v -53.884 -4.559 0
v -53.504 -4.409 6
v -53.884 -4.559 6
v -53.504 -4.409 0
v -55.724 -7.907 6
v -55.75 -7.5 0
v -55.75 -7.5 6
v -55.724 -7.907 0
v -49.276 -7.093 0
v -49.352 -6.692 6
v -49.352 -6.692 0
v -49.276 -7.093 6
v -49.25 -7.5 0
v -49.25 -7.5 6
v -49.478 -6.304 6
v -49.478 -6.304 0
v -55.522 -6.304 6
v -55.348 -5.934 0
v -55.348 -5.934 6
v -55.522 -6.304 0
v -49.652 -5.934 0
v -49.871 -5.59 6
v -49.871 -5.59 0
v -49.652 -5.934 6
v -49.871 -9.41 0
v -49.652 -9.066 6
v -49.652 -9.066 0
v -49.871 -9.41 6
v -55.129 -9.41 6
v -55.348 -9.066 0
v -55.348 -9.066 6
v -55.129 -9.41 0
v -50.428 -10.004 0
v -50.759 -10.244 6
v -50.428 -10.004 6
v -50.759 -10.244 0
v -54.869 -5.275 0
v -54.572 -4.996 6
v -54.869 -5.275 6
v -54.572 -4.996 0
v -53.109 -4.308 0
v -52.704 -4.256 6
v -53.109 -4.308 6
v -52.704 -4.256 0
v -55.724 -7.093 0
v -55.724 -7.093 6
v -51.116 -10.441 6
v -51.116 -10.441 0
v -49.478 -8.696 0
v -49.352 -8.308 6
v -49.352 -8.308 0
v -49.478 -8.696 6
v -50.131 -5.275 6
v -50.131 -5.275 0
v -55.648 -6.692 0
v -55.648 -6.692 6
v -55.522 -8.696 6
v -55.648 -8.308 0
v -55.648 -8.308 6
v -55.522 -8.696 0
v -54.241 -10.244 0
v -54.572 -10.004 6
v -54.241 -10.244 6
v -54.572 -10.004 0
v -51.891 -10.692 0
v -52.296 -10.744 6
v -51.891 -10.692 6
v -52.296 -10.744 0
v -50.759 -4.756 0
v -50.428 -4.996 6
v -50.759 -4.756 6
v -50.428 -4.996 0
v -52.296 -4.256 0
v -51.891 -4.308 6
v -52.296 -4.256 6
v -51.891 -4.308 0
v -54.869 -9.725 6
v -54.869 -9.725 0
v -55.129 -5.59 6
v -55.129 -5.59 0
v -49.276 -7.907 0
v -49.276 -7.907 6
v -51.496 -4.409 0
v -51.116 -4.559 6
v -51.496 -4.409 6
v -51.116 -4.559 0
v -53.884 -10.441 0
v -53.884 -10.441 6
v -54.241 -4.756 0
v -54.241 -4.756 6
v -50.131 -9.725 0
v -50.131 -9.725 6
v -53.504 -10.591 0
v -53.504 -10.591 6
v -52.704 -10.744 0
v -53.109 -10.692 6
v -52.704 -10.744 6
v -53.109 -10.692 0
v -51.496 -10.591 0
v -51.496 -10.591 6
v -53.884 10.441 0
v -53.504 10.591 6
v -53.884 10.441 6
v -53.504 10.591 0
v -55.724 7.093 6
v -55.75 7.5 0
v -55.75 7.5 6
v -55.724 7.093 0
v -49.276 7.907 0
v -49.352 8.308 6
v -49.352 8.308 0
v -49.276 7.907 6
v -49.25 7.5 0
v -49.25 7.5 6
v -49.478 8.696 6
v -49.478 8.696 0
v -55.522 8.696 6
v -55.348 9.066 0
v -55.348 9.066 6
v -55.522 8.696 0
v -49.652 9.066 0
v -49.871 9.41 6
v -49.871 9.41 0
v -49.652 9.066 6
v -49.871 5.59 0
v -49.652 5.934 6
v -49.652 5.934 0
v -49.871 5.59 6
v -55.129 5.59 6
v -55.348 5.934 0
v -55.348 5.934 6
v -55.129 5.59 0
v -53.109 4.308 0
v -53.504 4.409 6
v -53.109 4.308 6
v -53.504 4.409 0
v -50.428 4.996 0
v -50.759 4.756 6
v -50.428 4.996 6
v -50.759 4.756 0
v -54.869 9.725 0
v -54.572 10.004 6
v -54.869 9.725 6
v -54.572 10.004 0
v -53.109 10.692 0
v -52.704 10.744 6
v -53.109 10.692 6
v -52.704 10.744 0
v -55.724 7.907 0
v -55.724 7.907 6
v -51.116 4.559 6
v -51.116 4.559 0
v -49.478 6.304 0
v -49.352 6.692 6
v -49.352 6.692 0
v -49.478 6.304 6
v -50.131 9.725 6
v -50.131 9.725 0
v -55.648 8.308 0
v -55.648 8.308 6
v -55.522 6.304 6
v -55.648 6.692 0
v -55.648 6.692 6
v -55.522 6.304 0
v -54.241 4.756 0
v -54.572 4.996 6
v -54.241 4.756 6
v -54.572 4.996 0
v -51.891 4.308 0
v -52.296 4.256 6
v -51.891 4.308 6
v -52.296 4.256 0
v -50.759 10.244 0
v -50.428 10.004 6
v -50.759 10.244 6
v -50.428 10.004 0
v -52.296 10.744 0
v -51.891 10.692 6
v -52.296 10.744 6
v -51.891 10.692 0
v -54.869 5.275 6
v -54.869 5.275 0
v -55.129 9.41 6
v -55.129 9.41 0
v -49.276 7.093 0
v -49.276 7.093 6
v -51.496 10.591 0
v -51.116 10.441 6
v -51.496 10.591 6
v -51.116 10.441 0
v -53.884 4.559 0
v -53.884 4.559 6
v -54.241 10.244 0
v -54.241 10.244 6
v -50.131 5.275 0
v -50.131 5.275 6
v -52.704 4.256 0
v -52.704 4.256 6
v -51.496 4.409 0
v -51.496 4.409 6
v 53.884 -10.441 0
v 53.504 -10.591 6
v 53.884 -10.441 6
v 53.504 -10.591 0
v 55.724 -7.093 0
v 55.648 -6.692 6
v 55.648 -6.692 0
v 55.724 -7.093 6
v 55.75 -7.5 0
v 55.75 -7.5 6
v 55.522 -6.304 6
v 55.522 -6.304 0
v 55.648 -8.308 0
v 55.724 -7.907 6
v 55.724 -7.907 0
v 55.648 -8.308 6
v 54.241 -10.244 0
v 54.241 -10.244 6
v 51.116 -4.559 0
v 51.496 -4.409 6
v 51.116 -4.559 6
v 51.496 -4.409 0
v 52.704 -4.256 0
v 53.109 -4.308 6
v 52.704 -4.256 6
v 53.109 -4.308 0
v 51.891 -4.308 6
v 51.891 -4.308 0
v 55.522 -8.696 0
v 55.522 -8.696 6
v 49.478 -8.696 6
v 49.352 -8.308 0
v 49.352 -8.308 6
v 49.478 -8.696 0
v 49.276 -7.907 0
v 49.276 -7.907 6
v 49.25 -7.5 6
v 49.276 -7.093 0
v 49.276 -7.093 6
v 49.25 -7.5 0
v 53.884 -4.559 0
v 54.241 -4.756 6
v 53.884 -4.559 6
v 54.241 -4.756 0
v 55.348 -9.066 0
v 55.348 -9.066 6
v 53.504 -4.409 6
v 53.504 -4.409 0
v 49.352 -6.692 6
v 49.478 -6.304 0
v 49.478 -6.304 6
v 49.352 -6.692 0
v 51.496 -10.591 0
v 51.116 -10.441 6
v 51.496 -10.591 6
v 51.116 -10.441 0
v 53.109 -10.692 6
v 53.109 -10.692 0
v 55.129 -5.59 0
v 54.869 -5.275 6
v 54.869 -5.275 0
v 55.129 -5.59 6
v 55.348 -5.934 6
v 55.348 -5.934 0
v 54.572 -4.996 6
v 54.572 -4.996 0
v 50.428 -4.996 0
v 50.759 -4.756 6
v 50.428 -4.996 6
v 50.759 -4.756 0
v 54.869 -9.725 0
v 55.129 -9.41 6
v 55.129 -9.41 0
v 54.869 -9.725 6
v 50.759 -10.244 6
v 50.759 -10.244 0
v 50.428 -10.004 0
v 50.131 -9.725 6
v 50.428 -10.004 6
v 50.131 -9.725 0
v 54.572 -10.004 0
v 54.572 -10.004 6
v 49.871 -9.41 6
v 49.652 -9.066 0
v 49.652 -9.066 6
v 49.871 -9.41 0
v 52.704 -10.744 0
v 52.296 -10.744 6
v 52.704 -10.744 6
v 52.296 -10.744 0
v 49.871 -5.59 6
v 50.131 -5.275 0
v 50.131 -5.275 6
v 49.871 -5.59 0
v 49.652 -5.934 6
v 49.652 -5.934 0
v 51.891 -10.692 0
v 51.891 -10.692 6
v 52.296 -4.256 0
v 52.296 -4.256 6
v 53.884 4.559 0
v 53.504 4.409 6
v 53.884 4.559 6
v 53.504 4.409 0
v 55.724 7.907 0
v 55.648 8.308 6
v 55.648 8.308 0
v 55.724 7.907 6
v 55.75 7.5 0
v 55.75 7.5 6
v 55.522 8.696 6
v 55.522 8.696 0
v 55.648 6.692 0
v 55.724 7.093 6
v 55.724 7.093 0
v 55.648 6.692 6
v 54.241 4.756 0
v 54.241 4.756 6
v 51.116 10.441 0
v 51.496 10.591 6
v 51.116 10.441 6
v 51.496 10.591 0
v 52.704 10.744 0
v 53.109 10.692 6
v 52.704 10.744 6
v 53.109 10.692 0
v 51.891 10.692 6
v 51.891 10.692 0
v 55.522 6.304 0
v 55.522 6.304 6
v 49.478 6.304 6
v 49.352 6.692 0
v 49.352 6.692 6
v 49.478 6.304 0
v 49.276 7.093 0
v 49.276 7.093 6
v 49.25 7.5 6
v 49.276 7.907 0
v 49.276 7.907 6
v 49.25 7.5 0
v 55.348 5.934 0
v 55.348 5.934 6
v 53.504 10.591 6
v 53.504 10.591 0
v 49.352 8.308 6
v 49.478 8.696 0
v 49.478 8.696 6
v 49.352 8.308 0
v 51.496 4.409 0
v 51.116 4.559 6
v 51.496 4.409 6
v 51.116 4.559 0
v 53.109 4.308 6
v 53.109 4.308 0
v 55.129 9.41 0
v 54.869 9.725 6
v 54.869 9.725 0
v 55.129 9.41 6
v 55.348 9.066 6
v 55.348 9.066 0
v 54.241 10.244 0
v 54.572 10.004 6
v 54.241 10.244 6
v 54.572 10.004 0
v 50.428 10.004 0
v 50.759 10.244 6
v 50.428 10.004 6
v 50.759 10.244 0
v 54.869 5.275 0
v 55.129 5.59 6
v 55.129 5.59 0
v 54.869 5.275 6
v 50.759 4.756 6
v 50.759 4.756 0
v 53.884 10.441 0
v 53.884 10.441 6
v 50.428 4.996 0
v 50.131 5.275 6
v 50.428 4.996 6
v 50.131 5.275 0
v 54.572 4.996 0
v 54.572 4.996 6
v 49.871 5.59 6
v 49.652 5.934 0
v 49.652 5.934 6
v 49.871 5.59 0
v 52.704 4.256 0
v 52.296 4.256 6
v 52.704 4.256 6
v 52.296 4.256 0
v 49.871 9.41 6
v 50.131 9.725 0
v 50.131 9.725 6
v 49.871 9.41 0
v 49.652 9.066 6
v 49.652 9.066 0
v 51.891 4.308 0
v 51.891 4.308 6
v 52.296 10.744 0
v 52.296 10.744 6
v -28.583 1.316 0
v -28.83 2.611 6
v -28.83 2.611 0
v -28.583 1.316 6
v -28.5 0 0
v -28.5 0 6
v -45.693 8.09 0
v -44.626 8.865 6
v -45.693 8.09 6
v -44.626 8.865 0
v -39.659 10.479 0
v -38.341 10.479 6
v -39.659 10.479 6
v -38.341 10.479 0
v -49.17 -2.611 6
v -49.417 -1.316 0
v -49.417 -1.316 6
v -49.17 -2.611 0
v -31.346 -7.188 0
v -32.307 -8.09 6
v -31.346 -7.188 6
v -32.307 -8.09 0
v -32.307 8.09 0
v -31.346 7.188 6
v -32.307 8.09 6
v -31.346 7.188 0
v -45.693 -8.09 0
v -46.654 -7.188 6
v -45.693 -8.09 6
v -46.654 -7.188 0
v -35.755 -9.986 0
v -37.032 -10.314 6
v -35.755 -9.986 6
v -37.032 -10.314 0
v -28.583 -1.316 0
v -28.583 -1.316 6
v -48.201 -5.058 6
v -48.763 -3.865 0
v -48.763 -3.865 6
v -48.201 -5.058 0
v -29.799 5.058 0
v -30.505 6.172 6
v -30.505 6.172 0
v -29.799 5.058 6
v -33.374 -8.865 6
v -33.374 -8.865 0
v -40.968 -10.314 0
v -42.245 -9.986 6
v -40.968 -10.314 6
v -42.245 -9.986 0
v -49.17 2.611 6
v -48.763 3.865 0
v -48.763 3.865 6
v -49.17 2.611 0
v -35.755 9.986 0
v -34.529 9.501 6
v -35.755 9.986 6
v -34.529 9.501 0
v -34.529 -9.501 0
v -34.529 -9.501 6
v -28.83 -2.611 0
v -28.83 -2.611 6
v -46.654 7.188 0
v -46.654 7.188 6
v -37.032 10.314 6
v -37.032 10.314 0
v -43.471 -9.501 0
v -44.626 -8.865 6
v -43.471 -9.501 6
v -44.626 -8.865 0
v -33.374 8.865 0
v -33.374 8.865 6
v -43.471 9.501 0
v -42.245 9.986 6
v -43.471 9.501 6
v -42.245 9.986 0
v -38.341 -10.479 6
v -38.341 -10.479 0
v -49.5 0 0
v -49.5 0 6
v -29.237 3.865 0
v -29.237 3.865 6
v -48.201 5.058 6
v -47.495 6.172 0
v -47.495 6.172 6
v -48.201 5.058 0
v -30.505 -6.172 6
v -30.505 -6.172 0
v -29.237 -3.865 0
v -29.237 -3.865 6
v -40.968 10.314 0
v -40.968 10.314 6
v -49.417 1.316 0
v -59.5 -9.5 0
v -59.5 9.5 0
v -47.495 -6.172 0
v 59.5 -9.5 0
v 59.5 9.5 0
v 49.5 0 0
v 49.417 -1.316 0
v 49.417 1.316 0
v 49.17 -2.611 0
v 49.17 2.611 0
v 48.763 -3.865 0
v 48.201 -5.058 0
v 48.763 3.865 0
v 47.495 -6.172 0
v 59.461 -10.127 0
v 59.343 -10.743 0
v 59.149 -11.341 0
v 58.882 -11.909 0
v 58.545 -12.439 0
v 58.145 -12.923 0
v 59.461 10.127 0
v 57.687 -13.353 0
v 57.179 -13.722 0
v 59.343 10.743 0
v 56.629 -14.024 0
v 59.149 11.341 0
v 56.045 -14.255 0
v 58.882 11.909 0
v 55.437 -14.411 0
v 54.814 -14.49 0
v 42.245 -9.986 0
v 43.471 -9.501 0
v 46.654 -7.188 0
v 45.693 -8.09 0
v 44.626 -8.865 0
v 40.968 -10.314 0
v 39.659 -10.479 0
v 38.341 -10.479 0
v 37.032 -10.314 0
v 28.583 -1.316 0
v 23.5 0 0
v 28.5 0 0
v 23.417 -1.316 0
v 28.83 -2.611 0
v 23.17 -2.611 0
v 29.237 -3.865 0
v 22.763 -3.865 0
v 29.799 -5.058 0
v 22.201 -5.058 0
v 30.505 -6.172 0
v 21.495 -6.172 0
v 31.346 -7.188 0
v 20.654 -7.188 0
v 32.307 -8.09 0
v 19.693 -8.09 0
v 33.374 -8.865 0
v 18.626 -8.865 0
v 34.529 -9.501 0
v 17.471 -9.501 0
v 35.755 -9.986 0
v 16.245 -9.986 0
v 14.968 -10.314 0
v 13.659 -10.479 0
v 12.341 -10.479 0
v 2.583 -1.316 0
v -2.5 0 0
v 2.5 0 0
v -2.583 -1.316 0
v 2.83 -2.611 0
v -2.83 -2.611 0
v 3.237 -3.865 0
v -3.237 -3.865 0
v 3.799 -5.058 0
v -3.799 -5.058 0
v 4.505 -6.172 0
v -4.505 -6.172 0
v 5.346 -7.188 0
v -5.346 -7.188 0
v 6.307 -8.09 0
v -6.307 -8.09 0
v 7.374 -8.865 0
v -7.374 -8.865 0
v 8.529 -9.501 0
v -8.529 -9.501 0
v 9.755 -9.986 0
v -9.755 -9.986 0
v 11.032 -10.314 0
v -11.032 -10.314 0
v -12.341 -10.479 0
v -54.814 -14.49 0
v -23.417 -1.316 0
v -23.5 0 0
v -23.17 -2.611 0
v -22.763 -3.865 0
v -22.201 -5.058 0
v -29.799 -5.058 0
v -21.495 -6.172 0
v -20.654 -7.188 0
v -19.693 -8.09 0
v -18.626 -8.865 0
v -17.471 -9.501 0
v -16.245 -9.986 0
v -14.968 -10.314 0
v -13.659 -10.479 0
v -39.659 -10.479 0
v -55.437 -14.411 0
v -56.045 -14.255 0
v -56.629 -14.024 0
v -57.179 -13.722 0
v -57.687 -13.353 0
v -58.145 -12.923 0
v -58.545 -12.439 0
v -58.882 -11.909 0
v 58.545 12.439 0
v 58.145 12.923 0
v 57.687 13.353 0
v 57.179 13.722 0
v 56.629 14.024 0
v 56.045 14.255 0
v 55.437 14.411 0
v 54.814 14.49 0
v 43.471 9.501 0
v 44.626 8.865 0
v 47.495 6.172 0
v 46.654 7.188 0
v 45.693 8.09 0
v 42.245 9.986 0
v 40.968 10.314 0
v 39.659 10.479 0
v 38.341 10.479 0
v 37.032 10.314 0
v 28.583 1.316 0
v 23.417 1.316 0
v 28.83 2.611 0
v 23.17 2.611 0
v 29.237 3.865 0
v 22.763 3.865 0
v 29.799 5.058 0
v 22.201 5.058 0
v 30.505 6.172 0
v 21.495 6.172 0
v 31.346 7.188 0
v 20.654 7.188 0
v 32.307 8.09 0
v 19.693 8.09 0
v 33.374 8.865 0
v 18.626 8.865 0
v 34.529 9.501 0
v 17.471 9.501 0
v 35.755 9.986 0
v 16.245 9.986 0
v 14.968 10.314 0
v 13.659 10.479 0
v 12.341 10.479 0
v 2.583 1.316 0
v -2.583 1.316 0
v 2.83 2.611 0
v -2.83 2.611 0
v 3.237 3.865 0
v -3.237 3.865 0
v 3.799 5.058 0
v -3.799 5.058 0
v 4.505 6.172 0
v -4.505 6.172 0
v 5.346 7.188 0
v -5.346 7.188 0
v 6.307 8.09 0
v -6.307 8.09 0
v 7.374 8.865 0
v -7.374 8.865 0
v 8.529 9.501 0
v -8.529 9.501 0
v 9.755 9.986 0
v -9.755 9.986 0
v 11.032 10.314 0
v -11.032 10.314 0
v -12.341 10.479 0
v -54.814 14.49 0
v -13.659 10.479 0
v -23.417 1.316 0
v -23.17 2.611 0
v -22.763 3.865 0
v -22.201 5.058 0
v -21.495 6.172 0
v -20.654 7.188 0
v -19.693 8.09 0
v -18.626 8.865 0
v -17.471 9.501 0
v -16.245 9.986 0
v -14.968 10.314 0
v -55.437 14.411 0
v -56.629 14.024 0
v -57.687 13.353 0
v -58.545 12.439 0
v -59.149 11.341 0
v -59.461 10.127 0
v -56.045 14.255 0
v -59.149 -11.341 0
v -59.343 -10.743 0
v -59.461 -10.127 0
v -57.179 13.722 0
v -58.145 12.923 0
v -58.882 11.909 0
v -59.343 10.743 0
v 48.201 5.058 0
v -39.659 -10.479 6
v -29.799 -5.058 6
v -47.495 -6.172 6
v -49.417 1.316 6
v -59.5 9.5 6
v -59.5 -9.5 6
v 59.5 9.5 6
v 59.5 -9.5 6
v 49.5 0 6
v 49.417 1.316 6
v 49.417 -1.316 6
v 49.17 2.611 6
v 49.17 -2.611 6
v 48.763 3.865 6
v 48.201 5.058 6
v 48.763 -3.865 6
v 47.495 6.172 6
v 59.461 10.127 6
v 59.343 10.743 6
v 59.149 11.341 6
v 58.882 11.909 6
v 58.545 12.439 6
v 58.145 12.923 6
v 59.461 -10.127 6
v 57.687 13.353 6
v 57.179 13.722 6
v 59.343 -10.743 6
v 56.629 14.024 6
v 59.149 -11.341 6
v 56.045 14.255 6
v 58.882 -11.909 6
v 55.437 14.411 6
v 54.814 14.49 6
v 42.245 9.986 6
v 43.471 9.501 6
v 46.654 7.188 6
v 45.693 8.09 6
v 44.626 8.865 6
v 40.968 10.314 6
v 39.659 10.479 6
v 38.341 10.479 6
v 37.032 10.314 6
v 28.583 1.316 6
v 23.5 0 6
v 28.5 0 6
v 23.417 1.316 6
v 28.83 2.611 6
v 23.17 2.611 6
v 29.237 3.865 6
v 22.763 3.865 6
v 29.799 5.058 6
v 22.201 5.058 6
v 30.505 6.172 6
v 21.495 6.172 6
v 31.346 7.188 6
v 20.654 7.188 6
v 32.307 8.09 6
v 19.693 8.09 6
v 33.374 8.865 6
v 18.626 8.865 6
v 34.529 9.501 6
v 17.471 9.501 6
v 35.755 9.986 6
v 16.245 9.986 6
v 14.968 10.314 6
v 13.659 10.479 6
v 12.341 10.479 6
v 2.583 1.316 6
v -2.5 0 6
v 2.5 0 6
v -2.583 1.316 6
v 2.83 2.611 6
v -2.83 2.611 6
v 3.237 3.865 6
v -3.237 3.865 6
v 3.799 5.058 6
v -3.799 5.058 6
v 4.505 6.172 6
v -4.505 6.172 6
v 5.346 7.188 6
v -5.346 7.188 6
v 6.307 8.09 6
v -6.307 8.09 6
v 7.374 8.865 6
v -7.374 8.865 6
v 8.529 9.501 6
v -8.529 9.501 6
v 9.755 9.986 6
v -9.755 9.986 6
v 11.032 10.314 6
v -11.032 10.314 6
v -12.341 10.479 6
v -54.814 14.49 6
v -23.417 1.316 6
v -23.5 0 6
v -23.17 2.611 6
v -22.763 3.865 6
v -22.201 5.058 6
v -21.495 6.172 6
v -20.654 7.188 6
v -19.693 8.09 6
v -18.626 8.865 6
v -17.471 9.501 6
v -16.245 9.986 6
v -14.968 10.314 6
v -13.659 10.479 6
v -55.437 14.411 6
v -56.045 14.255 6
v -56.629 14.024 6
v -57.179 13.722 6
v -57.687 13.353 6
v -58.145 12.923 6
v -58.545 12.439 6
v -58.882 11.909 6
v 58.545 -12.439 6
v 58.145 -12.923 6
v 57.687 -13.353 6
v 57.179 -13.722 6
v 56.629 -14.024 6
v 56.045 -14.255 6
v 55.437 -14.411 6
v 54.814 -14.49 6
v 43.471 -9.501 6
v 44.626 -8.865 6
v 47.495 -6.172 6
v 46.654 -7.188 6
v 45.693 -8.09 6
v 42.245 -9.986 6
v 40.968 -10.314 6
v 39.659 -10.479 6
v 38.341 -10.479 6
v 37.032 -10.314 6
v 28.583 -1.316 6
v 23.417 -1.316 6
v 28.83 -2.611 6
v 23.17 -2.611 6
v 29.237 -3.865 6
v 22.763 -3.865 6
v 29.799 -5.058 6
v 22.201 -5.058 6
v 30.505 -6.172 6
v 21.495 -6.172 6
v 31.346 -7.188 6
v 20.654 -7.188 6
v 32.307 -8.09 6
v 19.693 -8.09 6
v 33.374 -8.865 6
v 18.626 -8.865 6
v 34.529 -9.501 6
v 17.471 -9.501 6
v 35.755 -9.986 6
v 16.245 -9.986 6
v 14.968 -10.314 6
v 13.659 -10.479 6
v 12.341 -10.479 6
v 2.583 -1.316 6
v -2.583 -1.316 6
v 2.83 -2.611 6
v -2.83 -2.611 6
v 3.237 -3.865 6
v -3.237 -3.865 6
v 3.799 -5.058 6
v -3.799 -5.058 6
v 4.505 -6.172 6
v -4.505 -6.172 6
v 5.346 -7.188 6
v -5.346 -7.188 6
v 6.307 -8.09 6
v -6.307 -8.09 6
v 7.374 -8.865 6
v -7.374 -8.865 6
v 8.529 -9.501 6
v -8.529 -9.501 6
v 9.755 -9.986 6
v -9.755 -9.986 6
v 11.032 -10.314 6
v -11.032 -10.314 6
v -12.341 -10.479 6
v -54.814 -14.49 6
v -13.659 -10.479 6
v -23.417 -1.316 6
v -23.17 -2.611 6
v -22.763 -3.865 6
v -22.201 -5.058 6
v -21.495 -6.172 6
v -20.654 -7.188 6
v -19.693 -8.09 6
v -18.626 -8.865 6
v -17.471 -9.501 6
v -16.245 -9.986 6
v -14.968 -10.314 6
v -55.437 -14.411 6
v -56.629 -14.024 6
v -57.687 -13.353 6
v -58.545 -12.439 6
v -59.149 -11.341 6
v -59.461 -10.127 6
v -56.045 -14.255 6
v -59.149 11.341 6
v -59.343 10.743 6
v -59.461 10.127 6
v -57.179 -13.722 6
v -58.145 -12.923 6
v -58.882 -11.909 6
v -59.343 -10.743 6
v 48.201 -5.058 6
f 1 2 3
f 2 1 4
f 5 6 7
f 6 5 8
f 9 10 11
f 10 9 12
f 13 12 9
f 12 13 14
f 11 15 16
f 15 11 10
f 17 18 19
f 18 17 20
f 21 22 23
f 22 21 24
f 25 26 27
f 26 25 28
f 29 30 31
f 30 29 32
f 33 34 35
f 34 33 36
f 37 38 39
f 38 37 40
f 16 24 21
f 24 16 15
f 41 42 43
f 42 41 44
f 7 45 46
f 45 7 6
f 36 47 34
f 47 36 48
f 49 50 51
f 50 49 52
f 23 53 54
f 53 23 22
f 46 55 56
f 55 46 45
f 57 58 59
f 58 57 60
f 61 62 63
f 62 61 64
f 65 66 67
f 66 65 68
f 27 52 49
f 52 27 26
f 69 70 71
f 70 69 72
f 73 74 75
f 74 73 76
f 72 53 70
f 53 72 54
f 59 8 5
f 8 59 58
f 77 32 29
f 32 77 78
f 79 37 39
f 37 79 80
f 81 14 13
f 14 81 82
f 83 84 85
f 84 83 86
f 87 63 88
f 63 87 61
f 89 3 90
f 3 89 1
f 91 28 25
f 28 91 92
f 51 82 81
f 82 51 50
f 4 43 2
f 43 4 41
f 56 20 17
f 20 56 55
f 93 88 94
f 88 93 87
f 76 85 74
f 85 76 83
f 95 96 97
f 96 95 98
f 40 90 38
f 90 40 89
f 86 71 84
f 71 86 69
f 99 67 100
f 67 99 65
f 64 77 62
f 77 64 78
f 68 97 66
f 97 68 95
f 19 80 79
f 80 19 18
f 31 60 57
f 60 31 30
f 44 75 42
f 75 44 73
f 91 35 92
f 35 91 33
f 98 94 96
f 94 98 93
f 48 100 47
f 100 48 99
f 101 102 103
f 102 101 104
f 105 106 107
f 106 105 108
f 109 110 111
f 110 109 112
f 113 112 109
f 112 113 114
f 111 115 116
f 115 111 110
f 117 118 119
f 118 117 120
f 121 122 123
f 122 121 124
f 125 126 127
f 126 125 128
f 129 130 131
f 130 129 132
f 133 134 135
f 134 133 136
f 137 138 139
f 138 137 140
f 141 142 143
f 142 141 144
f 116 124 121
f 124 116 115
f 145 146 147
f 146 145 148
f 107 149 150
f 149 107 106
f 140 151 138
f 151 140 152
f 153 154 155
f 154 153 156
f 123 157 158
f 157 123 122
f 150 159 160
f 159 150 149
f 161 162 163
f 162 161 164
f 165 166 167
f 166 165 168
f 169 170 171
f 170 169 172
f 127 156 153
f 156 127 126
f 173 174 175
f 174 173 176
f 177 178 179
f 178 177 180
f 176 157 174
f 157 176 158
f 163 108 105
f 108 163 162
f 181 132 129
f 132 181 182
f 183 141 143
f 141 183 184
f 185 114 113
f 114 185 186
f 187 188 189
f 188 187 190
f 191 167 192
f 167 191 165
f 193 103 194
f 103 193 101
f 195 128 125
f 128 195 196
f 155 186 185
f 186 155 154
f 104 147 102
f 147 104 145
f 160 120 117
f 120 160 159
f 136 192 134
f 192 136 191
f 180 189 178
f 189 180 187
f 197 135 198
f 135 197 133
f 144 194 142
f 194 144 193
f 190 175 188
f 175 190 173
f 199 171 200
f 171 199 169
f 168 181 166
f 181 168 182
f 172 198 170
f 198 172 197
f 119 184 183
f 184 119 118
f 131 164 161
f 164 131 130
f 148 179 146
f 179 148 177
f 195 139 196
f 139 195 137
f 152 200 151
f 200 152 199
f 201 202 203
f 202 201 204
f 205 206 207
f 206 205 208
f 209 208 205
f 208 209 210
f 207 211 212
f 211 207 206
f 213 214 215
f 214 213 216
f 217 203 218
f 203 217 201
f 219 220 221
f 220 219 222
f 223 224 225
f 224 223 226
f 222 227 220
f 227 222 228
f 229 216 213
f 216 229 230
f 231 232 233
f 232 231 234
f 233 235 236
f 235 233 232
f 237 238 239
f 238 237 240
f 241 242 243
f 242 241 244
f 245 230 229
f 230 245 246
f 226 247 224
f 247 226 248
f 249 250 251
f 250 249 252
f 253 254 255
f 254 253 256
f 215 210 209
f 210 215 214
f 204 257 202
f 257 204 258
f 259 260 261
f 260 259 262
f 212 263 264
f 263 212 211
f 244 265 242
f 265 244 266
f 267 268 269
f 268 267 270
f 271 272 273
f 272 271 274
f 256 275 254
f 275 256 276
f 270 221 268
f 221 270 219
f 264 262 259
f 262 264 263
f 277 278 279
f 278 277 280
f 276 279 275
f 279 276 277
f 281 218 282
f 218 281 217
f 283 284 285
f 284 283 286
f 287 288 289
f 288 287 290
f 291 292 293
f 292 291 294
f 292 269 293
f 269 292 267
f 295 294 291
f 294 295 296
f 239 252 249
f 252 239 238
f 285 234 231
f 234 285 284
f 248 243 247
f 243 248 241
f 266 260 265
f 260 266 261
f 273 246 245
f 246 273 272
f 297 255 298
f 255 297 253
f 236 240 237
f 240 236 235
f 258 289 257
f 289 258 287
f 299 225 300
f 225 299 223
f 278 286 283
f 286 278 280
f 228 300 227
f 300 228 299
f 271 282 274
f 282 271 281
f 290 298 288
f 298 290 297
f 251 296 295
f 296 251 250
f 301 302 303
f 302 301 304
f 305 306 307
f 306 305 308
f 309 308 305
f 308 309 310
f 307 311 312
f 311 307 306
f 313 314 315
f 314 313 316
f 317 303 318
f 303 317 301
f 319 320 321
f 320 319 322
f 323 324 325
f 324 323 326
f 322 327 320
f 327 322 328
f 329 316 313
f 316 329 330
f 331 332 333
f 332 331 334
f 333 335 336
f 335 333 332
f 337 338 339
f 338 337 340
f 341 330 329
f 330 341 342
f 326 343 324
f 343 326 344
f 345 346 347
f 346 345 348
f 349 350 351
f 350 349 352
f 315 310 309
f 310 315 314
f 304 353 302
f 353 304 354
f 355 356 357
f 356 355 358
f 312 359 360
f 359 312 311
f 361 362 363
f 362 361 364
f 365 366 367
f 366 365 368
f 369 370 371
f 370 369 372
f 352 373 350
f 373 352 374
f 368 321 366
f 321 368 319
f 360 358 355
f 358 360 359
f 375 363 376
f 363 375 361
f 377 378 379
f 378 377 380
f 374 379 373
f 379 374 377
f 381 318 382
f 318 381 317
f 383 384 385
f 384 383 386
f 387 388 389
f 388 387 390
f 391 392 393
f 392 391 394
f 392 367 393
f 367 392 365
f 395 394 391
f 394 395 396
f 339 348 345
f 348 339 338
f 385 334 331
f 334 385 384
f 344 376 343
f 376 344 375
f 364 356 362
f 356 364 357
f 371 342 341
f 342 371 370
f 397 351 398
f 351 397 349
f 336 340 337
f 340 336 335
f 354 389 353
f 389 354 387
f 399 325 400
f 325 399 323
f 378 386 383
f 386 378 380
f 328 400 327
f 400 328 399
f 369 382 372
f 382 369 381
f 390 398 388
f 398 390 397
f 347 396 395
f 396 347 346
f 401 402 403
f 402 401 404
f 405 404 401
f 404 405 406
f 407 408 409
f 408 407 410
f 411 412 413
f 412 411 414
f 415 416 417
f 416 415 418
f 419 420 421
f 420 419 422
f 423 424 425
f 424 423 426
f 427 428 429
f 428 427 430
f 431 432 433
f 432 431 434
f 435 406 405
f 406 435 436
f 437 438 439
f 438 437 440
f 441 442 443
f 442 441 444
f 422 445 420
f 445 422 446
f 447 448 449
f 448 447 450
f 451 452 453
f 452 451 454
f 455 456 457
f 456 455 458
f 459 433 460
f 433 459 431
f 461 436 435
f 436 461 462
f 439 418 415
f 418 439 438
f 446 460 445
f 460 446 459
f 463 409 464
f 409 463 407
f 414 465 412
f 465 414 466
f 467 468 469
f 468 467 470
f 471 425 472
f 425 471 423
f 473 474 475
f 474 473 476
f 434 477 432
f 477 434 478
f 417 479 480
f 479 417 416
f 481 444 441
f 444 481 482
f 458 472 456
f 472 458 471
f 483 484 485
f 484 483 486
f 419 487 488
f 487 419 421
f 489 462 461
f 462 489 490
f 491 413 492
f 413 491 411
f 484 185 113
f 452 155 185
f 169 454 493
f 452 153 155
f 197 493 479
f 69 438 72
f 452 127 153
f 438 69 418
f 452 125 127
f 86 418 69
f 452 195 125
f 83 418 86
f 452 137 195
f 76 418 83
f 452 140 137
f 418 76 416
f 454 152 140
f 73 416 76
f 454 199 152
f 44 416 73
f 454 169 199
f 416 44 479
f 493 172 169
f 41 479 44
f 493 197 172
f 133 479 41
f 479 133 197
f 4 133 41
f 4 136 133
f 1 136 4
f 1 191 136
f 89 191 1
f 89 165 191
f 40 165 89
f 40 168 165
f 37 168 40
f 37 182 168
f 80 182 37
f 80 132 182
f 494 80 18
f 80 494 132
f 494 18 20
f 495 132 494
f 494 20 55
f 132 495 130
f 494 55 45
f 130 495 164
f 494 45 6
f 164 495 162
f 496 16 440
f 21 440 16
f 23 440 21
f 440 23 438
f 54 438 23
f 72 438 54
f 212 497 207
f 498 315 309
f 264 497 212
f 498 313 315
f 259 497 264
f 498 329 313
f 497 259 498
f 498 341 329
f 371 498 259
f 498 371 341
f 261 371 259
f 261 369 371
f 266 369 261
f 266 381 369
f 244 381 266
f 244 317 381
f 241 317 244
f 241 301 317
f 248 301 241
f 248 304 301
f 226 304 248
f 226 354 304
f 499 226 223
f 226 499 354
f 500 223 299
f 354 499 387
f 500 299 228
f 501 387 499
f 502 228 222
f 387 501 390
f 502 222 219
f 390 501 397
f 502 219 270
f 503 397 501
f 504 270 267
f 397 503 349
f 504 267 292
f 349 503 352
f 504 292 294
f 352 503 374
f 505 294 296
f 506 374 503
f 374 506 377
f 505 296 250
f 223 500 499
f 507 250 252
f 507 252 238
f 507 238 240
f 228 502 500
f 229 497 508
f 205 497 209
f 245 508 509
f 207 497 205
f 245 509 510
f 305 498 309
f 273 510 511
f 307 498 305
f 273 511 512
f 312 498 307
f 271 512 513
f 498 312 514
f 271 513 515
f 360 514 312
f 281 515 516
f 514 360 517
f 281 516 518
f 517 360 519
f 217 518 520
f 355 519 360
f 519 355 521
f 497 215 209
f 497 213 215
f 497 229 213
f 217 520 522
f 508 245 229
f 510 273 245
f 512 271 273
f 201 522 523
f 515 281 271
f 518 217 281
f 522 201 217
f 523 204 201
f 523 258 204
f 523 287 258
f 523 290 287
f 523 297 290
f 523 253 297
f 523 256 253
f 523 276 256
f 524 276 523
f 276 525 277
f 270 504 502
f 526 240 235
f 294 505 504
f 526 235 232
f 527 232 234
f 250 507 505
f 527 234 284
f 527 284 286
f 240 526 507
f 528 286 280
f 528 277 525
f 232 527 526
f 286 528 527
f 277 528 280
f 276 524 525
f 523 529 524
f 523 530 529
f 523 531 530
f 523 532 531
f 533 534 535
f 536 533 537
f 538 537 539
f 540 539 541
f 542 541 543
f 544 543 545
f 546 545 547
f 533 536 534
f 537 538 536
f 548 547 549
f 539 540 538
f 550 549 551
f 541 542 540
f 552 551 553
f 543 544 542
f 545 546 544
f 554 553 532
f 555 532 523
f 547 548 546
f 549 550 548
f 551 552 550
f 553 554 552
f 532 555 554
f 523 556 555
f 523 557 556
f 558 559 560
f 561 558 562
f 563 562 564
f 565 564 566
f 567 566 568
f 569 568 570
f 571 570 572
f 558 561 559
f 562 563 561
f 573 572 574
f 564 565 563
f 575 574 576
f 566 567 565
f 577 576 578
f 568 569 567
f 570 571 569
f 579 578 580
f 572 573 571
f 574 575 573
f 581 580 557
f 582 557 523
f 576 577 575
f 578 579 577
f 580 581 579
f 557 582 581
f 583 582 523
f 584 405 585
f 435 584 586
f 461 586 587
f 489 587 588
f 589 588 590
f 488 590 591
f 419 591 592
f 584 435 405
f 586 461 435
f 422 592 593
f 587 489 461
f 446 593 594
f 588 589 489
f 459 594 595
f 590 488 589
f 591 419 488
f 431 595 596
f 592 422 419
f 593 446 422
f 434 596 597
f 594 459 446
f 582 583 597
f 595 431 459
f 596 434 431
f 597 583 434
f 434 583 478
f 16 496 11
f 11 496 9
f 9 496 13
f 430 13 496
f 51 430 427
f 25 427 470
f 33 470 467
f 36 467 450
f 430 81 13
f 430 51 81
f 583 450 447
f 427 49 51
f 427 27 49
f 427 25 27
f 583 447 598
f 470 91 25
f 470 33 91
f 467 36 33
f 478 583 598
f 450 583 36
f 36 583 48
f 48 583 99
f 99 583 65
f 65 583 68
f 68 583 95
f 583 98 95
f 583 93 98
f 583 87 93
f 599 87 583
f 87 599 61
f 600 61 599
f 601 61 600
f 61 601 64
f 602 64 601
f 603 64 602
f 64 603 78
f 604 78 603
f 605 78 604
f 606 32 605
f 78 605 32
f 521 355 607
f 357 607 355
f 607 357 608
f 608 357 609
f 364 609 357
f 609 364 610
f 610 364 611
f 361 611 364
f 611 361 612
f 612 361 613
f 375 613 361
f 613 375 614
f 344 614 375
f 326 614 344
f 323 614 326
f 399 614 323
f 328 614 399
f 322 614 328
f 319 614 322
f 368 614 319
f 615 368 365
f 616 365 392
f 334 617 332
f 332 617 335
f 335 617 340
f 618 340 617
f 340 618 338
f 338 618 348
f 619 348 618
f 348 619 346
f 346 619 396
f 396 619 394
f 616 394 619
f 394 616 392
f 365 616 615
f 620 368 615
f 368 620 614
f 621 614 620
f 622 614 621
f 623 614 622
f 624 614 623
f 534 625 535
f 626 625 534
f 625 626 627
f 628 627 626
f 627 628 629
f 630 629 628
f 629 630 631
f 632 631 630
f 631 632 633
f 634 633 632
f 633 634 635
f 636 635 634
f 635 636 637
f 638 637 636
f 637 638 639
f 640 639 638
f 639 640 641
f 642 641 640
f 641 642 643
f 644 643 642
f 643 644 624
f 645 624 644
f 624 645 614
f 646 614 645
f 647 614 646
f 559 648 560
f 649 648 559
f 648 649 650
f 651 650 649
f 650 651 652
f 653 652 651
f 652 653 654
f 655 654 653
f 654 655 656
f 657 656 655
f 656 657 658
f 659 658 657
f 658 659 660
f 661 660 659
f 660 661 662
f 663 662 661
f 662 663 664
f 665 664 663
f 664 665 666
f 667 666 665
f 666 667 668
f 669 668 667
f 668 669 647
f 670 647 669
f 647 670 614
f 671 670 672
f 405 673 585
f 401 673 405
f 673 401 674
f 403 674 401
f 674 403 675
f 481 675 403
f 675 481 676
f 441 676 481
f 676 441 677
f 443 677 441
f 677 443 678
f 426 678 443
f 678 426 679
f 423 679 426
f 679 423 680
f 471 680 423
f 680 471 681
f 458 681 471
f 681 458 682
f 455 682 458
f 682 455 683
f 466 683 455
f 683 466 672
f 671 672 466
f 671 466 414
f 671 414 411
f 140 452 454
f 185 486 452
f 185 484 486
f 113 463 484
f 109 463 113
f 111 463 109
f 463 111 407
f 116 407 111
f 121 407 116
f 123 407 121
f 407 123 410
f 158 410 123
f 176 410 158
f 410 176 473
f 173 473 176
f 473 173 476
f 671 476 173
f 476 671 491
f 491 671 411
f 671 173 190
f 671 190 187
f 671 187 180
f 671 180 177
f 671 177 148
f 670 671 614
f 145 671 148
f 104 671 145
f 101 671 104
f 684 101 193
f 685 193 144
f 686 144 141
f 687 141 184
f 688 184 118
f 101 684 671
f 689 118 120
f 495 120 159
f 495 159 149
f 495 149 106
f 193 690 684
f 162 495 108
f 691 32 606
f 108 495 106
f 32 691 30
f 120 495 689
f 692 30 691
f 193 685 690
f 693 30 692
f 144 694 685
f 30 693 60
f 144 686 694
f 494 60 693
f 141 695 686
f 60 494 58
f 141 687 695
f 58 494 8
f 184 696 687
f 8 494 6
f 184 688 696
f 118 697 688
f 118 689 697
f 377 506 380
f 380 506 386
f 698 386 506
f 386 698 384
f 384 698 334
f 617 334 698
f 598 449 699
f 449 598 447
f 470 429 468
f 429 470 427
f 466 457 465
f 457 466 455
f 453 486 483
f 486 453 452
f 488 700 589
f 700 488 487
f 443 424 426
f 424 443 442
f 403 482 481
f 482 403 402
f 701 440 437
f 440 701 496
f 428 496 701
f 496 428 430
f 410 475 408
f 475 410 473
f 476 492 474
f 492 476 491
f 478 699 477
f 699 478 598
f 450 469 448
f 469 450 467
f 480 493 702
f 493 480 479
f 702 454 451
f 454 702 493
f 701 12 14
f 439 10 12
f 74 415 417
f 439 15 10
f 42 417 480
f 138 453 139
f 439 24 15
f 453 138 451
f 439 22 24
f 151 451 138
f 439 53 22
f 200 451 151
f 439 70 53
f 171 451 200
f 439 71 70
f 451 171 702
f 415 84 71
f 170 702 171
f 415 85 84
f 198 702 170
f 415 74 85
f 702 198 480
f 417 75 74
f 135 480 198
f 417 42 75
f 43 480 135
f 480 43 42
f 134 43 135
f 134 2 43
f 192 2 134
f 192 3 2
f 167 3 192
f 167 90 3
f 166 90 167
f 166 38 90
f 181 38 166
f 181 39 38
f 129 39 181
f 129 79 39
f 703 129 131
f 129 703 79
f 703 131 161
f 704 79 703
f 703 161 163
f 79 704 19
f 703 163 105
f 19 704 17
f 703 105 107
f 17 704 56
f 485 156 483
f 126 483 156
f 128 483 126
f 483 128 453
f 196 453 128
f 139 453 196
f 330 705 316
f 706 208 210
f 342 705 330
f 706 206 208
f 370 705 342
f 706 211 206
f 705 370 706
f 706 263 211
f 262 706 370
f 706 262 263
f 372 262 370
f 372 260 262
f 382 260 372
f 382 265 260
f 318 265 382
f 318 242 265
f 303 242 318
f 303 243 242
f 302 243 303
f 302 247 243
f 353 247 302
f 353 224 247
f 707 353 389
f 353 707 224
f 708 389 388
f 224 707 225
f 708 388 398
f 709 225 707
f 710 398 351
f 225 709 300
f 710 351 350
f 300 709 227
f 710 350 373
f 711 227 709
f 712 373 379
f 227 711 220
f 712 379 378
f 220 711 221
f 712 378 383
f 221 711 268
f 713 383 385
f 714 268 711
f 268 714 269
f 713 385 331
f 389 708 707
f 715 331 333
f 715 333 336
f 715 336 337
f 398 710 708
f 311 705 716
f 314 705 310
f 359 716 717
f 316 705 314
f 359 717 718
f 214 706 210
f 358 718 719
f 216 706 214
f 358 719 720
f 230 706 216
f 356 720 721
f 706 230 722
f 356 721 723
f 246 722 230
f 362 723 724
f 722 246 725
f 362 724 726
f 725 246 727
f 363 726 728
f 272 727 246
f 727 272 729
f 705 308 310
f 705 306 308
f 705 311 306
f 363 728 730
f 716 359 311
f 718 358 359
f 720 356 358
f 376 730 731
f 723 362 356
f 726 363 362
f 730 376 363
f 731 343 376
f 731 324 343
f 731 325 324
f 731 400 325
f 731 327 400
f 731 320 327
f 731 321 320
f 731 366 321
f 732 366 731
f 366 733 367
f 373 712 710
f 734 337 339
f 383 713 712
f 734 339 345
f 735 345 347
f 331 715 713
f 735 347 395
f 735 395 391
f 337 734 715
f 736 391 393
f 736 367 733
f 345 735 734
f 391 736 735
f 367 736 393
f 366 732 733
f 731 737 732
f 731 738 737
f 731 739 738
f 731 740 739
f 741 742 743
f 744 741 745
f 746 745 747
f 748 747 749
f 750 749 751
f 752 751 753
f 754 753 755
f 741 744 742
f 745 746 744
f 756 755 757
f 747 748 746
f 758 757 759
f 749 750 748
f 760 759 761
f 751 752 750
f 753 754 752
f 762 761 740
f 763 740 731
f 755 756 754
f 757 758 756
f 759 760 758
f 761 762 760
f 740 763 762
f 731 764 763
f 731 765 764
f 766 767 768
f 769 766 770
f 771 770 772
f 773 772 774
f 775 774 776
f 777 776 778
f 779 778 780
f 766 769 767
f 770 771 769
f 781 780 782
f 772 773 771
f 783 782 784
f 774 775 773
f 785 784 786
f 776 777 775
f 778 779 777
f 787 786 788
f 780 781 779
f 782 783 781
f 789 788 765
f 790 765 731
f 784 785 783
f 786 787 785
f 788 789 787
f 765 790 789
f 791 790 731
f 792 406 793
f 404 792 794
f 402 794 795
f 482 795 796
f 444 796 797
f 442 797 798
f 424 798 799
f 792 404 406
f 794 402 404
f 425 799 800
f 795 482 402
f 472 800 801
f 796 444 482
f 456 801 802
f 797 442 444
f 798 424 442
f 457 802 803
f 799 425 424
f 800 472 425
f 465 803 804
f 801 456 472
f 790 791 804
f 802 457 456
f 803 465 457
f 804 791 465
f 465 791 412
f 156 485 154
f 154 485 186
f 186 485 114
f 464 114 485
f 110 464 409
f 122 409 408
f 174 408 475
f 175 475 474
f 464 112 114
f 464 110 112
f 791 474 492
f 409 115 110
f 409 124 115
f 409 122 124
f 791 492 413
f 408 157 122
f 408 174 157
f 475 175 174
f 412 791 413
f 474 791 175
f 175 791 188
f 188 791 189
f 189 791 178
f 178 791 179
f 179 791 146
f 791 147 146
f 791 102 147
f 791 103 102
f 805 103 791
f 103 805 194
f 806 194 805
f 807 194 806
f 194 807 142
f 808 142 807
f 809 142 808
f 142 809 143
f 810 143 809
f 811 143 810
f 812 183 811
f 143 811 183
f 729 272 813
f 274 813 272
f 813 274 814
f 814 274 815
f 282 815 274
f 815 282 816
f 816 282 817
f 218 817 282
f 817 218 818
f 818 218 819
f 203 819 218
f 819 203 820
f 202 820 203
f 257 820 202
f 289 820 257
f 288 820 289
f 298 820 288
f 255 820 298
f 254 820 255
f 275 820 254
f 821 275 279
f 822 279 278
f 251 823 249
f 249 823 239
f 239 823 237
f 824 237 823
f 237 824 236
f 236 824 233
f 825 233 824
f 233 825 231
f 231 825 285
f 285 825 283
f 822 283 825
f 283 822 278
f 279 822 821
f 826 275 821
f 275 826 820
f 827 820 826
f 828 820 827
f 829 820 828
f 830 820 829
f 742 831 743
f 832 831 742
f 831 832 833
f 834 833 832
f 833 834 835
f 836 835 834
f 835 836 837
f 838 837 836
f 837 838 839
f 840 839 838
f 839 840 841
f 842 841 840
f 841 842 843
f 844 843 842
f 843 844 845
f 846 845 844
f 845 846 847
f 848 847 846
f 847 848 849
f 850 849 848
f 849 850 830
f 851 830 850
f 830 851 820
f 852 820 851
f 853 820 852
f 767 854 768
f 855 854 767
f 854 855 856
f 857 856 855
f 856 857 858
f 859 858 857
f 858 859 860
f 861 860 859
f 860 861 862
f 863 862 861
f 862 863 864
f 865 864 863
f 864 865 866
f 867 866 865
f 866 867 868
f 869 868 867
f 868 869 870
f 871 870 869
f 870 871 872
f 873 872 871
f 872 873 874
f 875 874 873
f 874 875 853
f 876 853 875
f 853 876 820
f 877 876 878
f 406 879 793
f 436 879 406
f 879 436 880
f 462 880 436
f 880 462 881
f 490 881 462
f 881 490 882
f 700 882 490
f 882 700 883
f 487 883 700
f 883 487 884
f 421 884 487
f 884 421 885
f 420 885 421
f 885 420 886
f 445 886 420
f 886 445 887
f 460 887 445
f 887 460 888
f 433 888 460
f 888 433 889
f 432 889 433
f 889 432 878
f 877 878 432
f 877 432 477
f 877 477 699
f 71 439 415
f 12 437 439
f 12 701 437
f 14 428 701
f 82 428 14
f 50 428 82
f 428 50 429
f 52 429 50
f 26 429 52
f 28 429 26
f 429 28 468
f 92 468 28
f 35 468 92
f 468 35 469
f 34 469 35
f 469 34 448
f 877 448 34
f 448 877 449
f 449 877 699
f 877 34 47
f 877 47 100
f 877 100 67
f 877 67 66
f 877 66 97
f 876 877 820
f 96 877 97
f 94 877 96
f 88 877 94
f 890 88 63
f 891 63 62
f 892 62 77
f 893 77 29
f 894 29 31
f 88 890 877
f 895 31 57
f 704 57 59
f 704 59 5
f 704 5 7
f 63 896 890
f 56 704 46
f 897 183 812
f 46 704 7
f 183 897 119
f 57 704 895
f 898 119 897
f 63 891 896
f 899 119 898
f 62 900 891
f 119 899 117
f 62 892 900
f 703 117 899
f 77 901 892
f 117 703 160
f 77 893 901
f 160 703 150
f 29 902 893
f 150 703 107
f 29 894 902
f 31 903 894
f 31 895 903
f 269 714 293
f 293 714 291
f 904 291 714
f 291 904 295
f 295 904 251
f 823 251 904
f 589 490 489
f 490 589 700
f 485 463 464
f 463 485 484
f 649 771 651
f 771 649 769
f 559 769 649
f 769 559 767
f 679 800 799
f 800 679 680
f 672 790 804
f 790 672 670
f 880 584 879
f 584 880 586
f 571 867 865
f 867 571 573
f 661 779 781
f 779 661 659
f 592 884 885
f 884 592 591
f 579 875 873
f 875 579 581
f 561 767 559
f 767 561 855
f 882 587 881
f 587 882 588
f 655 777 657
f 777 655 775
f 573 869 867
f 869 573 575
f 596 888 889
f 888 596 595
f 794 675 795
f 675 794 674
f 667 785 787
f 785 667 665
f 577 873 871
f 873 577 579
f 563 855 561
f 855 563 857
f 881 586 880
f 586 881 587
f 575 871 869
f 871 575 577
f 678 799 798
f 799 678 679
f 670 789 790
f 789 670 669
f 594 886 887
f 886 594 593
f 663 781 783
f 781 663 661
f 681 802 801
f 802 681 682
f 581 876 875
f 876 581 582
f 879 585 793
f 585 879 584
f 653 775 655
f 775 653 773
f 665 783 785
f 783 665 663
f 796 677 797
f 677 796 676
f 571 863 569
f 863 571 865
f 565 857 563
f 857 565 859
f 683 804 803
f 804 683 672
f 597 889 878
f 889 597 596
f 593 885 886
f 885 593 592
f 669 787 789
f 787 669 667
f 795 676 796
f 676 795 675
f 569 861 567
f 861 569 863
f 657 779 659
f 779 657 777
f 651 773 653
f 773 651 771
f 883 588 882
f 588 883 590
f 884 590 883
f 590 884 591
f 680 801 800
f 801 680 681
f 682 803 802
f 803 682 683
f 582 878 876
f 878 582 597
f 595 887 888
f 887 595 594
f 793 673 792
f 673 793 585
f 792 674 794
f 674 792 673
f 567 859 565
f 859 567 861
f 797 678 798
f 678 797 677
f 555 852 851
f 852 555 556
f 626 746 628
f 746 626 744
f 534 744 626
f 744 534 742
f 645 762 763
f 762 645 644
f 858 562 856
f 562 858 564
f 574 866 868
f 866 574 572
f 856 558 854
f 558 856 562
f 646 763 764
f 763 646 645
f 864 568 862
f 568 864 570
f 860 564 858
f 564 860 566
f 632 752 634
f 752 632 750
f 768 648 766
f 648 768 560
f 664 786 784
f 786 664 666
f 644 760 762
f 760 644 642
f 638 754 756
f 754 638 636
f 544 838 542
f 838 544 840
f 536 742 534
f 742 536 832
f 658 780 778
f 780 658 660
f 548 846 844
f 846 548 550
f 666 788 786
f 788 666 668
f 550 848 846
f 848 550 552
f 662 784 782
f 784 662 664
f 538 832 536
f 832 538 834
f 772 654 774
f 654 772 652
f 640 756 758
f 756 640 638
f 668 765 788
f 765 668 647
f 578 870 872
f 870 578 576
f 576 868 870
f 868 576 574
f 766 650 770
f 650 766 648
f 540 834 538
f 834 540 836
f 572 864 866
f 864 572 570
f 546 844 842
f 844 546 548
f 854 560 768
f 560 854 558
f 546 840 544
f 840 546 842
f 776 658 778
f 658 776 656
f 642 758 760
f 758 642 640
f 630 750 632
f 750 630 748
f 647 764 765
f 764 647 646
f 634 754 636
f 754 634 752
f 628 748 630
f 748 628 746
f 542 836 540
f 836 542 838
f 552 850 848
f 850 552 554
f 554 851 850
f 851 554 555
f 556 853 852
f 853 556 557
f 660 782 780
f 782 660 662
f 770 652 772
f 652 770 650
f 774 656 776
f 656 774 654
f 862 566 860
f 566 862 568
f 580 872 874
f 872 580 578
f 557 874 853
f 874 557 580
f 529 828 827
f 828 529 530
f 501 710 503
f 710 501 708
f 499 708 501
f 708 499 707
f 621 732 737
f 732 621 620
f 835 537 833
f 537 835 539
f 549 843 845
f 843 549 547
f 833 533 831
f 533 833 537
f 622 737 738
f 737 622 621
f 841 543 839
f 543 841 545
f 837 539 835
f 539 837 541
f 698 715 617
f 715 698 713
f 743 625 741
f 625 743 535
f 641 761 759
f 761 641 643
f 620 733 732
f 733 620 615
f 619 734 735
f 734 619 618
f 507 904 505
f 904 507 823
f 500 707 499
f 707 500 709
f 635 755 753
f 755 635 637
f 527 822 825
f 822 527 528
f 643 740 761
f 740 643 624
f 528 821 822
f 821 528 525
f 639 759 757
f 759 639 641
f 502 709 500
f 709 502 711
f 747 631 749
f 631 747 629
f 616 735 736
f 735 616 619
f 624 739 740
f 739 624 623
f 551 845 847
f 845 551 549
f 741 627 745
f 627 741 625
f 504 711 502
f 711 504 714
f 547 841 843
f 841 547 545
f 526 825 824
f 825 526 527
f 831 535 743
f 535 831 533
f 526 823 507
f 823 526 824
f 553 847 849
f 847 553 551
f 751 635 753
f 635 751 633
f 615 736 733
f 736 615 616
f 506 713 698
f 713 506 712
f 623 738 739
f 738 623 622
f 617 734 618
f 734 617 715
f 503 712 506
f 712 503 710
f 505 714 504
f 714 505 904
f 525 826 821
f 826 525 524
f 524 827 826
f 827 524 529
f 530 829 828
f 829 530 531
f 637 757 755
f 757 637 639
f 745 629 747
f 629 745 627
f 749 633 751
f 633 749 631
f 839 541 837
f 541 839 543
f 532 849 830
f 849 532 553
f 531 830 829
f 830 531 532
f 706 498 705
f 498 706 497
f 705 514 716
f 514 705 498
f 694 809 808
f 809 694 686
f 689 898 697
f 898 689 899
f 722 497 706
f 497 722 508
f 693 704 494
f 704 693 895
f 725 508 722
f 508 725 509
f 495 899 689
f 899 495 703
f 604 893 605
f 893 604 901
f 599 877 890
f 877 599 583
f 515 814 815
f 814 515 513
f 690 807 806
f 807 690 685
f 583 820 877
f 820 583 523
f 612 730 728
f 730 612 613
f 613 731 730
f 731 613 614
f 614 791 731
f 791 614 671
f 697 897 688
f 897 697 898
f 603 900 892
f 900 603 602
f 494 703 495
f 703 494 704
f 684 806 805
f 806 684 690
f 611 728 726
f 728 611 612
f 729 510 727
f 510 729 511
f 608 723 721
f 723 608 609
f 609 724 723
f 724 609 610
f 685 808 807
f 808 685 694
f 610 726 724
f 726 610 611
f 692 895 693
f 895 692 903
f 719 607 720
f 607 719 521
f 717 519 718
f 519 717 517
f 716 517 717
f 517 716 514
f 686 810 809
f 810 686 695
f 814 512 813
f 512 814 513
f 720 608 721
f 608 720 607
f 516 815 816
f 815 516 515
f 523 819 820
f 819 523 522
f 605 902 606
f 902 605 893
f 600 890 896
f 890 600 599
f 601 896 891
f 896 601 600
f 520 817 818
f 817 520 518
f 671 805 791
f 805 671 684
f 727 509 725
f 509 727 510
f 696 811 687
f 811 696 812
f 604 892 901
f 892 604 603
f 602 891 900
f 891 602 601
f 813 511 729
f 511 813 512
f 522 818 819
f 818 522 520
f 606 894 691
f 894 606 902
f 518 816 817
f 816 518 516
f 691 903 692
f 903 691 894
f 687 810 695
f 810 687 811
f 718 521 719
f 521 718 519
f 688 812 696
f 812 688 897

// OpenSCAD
$fn = 50;


difference() {
	union() {
		hull() {
			translate(v = [-54.5000000000, 9.5000000000, 0]) {
				cylinder(h = 6, r = 5);
			}
			translate(v = [54.5000000000, 9.5000000000, 0]) {
				cylinder(h = 6, r = 5);
			}
			translate(v = [-54.5000000000, -9.5000000000, 0]) {
				cylinder(h = 6, r = 5);
			}
			translate(v = [54.5000000000, -9.5000000000, 0]) {
				cylinder(h = 6, r = 5);
			}
		}
	}
	union() {
		#translate(v = [-52.5000000000, -7.5000000000, -100.0000000000]) {
			cylinder(h = 200, r = 3.2500000000);
		}
		#translate(v = [-52.5000000000, 7.5000000000, -100.0000000000]) {
			cylinder(h = 200, r = 3.2500000000);
		}
		#translate(v = [52.5000000000, -7.5000000000, -100.0000000000]) {
			cylinder(h = 200, r = 3.2500000000);
		}
		#translate(v = [52.5000000000, 7.5000000000, -100.0000000000]) {
			cylinder(h = 200, r = 3.2500000000);
		}
		#translate(v = [-39.0000000000, 0, 0]) {
			cylinder(h = 6, r = 10.5000000000);
		}
		#translate(v = [-13.0000000000, 0, 0]) {
			cylinder(h = 6, r = 10.5000000000);
		}
		#translate(v = [13.0000000000, 0, 0]) {
			cylinder(h = 6, r = 10.5000000000);
		}
		#translate(v = [39.0000000000, 0, 0]) {
			cylinder(h = 6, r = 10.5000000000);
		}
	}
}
